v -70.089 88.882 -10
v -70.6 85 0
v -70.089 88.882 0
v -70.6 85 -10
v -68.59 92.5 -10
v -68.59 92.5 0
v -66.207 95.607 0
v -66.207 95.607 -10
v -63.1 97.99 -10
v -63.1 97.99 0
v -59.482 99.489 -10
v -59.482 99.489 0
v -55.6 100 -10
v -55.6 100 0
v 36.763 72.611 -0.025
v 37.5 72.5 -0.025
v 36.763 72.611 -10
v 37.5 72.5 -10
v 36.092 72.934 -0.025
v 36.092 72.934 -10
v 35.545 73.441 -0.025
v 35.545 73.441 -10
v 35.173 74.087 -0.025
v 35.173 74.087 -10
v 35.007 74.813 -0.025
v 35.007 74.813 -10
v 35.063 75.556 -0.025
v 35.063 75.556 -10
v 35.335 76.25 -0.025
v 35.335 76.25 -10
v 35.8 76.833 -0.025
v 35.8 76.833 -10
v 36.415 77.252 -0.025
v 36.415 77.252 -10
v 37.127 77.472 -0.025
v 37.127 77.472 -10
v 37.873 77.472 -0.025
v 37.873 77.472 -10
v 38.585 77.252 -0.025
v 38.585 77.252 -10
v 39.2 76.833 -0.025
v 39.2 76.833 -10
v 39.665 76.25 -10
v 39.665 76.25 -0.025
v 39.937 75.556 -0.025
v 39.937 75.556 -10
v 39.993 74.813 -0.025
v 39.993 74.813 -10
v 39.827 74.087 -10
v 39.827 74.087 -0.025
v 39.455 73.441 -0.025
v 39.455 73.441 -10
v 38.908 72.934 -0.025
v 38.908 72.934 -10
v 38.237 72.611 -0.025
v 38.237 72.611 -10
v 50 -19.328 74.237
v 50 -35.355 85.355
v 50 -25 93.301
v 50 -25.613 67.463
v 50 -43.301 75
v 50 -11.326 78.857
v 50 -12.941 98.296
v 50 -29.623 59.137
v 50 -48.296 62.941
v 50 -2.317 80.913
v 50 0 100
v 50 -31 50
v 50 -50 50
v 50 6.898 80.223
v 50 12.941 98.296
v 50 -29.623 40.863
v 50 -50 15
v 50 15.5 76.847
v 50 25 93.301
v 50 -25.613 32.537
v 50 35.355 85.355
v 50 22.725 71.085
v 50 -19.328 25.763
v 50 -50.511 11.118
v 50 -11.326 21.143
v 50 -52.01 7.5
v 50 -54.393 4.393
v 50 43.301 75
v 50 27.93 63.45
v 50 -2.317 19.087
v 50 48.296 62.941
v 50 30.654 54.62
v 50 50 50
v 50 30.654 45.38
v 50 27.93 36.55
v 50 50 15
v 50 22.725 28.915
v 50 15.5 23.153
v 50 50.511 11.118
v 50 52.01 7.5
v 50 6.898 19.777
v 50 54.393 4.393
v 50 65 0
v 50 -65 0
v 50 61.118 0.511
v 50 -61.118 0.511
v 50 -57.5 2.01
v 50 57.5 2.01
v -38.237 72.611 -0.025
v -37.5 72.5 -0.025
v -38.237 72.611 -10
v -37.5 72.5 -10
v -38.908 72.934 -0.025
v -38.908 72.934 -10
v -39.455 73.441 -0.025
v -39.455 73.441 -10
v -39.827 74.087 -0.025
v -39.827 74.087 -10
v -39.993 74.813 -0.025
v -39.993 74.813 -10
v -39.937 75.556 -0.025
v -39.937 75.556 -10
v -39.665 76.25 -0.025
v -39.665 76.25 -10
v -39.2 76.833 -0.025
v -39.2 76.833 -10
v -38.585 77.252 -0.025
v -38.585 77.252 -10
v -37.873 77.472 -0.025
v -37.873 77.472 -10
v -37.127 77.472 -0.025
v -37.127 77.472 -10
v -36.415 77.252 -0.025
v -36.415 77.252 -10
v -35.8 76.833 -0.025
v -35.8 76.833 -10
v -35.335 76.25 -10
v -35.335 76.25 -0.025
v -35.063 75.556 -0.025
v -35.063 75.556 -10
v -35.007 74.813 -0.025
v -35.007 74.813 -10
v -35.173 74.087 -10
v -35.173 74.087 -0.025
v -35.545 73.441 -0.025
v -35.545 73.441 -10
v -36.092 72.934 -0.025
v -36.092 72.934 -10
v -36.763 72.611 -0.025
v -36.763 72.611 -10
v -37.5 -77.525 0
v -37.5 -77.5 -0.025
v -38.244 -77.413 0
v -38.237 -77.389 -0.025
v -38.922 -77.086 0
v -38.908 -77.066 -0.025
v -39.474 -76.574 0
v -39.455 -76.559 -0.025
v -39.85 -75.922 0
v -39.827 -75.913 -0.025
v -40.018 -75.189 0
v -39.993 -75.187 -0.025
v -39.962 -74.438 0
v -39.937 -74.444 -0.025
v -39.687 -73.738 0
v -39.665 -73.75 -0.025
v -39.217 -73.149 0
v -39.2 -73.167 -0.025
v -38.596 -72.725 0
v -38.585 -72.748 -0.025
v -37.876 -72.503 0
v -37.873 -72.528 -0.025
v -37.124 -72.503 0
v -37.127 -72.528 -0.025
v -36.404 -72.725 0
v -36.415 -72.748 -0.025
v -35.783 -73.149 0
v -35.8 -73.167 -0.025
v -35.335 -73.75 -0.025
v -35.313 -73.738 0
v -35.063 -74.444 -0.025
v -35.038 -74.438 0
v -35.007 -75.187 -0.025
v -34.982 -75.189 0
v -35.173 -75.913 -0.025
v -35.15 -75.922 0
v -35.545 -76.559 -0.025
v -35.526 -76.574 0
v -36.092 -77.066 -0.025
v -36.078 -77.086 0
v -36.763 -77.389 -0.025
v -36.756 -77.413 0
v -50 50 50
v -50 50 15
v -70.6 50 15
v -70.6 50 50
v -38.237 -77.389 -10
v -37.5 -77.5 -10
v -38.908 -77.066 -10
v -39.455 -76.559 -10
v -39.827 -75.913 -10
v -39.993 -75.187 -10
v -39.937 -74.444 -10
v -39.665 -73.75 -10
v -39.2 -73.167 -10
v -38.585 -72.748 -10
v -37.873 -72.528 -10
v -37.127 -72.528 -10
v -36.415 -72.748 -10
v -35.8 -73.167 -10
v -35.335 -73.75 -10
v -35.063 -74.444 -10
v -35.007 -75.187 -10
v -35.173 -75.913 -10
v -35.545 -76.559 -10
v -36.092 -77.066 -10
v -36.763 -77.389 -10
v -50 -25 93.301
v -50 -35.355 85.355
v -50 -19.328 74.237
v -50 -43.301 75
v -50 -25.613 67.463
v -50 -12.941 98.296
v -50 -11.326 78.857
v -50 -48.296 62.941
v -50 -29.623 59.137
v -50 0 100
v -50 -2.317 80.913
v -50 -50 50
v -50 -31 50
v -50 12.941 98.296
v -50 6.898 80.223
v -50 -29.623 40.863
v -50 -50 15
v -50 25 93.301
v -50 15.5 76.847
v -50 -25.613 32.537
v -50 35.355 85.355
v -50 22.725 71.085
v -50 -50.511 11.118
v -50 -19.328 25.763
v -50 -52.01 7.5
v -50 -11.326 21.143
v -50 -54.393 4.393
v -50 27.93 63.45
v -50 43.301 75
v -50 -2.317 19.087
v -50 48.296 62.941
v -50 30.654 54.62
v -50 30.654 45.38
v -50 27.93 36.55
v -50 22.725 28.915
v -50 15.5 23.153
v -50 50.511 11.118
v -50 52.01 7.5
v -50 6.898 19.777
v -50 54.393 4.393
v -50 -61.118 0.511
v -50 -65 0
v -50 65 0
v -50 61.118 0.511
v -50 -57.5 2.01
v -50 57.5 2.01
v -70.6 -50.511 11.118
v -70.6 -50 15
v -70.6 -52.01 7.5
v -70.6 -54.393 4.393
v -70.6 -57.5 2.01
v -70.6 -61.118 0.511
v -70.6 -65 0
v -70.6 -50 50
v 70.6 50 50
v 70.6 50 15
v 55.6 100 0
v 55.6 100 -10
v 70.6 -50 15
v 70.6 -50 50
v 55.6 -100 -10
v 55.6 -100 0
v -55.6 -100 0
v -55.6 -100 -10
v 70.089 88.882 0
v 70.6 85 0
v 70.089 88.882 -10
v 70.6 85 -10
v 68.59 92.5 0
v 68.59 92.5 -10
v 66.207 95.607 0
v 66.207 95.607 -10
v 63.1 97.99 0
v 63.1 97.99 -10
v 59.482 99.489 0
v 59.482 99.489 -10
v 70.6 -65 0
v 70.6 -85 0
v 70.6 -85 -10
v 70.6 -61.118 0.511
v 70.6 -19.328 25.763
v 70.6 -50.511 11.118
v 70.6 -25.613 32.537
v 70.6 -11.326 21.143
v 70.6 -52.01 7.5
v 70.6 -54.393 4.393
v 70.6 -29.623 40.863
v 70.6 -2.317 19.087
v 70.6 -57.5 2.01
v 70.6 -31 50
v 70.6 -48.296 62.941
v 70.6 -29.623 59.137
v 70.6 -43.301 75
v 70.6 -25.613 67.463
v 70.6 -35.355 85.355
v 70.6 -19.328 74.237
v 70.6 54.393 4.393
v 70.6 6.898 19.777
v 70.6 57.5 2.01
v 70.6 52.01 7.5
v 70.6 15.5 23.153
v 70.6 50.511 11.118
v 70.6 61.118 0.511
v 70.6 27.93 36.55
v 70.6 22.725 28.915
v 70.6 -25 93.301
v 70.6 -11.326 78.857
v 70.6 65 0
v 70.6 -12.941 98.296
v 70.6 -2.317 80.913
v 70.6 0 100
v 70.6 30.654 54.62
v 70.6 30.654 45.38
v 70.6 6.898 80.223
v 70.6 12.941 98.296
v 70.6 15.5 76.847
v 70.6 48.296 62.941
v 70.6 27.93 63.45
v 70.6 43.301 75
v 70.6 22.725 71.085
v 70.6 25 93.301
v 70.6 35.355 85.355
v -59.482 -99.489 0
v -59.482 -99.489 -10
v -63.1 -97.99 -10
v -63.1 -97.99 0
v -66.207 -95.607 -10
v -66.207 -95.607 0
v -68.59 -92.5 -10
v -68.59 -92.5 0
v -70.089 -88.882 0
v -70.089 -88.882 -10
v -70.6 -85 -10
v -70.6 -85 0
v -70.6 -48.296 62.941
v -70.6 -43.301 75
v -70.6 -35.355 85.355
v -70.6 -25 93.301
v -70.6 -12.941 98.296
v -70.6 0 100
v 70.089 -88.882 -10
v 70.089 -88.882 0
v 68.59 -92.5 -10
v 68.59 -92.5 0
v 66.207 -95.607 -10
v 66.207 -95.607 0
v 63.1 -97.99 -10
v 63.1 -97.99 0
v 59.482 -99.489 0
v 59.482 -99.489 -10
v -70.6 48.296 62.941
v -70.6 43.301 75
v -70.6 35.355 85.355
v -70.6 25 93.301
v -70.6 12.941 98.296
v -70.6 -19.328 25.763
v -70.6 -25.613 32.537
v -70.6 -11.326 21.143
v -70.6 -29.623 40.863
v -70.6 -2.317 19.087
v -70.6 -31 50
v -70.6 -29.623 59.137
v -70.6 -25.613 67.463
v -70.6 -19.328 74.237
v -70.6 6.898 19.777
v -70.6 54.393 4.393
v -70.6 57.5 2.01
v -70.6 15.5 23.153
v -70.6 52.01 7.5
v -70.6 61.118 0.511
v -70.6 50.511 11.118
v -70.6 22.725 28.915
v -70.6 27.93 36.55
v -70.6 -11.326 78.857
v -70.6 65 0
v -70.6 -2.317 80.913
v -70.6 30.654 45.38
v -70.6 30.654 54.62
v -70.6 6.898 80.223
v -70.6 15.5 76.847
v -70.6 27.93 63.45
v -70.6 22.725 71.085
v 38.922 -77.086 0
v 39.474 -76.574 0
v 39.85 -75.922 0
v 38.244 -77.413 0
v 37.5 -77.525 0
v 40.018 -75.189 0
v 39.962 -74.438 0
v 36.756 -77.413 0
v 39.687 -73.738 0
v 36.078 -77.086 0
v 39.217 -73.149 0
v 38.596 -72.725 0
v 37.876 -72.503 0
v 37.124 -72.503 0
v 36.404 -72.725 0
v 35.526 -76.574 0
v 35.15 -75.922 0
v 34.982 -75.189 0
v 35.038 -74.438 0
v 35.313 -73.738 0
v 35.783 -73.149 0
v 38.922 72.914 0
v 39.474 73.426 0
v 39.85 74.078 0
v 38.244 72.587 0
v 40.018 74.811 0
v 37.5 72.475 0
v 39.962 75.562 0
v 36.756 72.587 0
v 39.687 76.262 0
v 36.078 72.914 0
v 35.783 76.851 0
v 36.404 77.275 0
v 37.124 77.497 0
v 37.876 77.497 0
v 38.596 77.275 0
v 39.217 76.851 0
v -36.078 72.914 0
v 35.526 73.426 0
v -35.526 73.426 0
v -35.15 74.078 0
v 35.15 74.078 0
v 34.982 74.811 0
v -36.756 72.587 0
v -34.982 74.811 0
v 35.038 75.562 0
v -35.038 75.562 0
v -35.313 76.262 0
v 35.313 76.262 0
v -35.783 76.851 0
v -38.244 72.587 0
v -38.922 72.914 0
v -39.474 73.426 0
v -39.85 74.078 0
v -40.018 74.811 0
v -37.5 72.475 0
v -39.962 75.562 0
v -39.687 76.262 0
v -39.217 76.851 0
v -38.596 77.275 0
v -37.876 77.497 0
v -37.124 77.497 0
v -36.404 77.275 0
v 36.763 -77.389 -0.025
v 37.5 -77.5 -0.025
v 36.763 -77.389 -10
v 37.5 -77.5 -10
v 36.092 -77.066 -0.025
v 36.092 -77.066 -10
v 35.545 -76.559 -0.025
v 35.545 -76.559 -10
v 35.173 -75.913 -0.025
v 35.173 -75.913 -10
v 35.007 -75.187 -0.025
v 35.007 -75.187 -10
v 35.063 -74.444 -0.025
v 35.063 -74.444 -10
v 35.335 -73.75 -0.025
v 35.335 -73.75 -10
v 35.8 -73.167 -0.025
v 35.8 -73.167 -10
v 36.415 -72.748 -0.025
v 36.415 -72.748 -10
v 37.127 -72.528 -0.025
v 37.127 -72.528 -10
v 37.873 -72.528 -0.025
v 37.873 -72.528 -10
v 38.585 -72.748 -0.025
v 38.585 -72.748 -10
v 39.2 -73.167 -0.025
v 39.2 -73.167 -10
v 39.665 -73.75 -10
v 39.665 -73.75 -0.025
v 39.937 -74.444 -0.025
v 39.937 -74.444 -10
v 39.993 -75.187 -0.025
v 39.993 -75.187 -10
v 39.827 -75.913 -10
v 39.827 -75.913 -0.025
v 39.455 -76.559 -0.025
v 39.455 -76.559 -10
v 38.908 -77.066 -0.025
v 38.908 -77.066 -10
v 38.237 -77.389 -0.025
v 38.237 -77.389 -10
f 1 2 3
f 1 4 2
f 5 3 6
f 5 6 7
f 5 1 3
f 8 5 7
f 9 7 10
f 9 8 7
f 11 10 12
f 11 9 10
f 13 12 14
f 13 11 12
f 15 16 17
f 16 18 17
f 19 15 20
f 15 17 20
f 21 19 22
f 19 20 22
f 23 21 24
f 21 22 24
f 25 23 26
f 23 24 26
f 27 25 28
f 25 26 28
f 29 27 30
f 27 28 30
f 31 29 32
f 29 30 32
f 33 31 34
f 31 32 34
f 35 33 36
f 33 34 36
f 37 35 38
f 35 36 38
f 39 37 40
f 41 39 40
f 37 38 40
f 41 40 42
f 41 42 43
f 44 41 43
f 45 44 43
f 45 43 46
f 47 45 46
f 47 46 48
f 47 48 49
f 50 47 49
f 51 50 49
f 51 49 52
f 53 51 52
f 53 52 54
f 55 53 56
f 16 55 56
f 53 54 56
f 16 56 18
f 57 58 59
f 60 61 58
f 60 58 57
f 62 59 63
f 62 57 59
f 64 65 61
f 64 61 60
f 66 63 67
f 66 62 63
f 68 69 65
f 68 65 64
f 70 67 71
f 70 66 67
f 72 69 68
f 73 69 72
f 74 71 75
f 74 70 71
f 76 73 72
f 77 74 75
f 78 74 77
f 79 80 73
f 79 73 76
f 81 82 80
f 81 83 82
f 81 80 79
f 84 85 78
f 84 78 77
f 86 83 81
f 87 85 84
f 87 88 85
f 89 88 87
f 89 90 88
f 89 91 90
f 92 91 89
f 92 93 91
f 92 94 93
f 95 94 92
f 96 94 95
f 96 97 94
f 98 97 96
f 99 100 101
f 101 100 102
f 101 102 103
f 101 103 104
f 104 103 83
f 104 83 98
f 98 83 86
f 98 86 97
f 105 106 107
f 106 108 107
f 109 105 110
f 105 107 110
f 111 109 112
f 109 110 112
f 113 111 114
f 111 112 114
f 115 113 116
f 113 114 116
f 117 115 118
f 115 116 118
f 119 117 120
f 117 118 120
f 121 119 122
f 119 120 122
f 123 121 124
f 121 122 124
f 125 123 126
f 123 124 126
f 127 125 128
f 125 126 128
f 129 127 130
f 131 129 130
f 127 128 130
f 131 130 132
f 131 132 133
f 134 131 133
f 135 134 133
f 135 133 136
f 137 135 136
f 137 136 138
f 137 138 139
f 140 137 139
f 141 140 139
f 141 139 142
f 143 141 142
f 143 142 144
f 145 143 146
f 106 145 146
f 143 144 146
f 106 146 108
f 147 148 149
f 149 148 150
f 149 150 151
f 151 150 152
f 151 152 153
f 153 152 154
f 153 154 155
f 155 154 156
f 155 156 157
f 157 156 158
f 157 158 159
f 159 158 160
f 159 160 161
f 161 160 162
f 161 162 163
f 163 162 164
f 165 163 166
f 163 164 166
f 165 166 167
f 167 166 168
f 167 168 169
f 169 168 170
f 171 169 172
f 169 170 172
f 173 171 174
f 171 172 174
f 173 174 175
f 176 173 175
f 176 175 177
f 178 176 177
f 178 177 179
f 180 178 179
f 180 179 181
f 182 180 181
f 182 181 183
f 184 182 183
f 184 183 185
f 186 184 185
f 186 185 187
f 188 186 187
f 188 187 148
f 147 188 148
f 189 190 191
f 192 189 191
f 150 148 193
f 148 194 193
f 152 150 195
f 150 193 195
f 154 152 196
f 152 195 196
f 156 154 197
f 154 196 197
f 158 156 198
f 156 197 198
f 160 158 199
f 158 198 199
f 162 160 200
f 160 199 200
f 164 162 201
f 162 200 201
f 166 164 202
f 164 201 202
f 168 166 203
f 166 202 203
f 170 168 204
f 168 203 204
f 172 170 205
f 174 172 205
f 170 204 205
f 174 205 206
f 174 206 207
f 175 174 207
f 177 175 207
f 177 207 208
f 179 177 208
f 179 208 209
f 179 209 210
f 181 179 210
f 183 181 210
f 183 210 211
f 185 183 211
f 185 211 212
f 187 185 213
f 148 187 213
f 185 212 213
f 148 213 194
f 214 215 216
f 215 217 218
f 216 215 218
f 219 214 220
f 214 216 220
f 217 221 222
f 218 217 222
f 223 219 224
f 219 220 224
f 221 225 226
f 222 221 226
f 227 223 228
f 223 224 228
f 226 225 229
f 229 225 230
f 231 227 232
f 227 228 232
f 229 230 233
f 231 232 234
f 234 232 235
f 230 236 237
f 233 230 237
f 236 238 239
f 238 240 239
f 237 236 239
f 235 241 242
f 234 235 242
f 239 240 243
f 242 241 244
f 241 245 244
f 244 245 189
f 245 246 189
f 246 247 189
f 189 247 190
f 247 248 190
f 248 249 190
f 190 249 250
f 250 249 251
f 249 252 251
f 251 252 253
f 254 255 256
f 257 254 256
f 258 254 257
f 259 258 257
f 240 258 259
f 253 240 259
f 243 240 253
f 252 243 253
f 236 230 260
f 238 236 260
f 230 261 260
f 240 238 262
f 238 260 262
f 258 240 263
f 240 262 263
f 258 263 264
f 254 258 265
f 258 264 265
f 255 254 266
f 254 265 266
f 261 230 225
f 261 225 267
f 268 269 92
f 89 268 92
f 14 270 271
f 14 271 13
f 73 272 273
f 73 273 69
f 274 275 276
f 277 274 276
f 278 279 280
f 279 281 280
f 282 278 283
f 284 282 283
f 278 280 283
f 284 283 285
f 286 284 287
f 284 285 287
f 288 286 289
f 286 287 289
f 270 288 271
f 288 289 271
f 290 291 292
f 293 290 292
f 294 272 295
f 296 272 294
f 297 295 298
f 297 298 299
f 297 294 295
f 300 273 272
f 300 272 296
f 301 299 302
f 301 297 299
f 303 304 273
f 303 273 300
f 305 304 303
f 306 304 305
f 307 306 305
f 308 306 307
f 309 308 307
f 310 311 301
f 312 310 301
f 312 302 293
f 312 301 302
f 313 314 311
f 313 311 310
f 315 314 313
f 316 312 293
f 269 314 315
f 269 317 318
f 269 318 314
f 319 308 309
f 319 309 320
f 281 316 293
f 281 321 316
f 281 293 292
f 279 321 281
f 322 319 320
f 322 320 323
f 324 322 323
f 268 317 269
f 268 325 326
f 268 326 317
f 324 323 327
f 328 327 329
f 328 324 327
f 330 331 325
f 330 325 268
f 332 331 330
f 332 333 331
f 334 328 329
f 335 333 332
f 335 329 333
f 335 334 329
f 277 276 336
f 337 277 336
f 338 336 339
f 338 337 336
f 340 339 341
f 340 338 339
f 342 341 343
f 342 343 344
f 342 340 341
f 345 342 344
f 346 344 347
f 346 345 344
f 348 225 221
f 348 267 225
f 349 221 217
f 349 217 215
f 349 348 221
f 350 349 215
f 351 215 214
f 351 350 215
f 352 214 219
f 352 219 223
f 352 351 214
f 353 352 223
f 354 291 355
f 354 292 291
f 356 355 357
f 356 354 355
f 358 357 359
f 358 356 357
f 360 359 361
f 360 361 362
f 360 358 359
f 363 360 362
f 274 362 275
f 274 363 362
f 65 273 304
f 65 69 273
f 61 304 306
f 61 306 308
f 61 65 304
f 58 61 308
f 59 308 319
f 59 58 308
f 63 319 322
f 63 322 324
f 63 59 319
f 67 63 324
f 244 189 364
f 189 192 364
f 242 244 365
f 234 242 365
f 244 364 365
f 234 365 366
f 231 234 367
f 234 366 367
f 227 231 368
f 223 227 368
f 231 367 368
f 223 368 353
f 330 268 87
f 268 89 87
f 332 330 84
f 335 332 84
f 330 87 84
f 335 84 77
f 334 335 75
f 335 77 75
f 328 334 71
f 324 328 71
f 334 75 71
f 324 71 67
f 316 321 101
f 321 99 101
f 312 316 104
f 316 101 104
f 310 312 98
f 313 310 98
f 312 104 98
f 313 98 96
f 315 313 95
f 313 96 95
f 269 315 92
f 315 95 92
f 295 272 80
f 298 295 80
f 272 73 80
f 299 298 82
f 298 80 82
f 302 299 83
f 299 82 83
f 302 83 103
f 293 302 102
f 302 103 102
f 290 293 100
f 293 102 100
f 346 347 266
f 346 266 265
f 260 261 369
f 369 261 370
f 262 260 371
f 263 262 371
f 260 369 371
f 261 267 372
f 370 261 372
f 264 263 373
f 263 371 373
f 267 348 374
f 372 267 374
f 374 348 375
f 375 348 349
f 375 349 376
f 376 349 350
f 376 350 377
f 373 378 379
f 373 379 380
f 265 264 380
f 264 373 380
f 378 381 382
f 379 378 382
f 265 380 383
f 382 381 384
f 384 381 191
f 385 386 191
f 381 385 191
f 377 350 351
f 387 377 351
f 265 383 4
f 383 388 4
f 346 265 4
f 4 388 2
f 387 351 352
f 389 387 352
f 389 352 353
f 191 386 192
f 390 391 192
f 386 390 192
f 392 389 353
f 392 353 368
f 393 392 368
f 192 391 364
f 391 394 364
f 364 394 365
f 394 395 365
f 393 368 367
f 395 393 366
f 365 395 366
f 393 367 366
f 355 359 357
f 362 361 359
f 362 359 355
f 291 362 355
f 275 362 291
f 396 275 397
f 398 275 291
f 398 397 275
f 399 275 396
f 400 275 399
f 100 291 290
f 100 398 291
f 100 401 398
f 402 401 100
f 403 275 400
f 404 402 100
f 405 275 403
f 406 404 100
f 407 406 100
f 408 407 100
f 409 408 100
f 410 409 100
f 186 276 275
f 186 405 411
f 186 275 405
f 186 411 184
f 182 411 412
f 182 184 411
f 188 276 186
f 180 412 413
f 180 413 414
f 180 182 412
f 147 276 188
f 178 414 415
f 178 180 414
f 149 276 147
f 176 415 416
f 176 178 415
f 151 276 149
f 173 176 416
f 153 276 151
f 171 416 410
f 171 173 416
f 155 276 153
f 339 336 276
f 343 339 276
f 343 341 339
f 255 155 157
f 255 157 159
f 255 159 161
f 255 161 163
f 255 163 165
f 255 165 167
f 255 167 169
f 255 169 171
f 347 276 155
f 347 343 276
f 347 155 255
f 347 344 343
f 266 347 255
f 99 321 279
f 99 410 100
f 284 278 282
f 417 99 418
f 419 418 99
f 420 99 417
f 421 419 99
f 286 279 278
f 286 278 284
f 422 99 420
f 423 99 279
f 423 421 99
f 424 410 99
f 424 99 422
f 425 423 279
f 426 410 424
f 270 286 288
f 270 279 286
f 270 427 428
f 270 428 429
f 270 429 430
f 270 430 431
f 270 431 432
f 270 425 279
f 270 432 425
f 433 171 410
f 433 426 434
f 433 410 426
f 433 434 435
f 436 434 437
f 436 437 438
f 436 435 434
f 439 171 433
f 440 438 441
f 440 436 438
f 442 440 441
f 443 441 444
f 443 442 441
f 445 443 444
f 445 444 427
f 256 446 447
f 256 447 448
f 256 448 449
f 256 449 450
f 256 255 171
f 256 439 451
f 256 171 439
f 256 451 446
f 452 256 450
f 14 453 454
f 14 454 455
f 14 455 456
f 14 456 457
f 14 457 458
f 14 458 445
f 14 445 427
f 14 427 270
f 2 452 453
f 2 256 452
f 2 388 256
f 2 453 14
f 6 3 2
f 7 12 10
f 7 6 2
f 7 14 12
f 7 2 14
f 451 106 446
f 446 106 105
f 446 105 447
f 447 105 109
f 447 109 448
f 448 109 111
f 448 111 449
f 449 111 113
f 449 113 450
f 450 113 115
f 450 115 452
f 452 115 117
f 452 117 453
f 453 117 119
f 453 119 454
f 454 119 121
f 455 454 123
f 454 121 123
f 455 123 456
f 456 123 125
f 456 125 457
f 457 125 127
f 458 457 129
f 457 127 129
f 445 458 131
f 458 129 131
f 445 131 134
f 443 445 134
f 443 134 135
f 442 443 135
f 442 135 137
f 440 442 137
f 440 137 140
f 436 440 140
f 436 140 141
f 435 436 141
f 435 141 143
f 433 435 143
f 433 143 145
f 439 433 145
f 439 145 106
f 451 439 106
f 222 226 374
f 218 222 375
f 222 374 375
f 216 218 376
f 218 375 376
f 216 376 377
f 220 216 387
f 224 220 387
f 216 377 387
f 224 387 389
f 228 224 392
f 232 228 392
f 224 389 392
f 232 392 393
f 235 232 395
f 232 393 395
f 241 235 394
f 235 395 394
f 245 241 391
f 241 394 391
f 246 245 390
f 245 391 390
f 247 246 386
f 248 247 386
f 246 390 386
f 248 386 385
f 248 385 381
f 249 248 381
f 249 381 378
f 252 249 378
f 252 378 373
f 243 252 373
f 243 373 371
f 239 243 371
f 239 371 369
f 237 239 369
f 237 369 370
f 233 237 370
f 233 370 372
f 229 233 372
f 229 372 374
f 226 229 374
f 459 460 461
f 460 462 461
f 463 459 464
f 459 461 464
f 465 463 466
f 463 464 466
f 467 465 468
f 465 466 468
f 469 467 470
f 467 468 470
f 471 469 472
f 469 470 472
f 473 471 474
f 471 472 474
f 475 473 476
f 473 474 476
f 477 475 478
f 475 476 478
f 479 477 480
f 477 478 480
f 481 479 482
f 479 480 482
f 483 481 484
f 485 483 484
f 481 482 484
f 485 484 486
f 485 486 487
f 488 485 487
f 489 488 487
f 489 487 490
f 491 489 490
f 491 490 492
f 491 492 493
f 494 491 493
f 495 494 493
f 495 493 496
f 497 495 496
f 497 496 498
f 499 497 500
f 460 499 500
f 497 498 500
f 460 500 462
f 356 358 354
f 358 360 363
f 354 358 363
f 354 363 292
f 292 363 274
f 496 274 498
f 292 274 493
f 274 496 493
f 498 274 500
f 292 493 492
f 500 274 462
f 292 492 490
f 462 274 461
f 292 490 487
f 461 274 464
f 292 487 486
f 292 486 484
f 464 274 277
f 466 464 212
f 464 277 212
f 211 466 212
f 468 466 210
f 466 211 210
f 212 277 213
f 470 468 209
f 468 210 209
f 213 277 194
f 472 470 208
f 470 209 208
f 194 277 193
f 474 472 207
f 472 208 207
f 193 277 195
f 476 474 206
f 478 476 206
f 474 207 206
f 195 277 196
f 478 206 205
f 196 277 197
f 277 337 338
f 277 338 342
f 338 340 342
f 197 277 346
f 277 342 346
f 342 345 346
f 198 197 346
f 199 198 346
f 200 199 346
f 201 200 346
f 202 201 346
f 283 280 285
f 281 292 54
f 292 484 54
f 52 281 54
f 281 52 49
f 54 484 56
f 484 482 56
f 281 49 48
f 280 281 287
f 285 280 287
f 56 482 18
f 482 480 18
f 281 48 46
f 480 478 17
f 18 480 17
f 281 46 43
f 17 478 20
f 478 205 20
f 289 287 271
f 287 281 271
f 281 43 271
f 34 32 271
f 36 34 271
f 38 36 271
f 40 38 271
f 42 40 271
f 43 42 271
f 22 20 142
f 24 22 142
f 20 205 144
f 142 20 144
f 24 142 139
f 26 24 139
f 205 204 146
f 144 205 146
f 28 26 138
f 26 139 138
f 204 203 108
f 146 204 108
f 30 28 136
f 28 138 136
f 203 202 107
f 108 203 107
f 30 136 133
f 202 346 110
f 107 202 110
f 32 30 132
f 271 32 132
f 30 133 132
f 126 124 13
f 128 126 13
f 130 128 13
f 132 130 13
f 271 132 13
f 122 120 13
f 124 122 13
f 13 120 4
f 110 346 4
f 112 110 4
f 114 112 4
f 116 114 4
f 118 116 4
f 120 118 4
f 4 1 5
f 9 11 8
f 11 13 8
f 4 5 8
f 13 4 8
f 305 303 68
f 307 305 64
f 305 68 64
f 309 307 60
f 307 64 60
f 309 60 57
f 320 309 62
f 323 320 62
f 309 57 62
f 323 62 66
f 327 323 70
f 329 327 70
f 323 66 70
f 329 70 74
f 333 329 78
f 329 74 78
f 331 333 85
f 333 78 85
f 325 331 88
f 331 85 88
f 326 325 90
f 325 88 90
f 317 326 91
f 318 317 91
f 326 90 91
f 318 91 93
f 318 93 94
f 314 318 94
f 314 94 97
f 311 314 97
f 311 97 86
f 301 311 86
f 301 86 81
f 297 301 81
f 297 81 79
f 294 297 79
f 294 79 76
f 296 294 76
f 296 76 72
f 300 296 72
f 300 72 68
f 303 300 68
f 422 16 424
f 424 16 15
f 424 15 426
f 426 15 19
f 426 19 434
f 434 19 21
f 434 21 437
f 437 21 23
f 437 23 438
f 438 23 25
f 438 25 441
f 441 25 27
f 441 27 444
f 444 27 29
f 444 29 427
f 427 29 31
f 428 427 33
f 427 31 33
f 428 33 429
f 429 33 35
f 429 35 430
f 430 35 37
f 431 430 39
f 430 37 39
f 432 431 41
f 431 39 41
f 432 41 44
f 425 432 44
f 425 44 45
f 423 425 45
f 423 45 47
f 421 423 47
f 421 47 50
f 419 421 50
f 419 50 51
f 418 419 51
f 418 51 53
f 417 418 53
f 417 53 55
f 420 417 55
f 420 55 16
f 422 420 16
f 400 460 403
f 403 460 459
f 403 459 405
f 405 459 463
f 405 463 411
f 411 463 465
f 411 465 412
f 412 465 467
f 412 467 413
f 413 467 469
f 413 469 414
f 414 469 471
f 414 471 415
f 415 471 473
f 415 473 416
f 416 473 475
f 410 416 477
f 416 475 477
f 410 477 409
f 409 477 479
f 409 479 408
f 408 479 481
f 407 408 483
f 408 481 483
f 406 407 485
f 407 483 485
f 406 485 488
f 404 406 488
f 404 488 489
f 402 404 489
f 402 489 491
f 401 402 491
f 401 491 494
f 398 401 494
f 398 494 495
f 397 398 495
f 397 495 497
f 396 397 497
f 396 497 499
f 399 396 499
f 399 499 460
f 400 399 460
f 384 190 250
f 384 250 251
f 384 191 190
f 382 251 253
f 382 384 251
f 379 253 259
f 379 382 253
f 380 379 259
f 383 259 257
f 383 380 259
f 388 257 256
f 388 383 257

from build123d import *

# Parameters (mm, degrees)
SKETCH1_W                       = 200
SKETCH1_H                       = 141.2
BOSS_EXTRUDE1_DEPTH             = 10
SKETCH2_W                       = 100
SKETCH2_H                       = 20.6
BOSS_EXTRUDE2_DEPTH             = 100
FILLET1_R                       = 50
F_10_0MM_DOWEL_HOLE1_D          = 62
F_5_0MM_DOWEL_HOLE1_D           = 5
F_5_0MM_DOWEL_HOLE1_CSINK_D     = 5.05
F_5_0MM_DOWEL_HOLE1_CSINK_ANGLE = 90
FILLET2_R                       = 15


with BuildPart() as part:
    # Sketch1 → Boss-Extrude1 (new body)
    with BuildSketch(Plane(origin=(0, 0, 0), x_dir=(0, 1, 0), z_dir=(0, 0, 1))):
        Rectangle(SKETCH1_W, SKETCH1_H)
    extrude(amount=-BOSS_EXTRUDE1_DEPTH)

    # Sketch2 → Boss-Extrude2 (add)
    with BuildSketch(Plane(origin=(0, 0, 0), x_dir=(0, 1, 0), z_dir=(0, 0, 1))):
        with Locations((0, 60.3)):
            Rectangle(SKETCH2_W, SKETCH2_H)
        with Locations((0, -60.3)):
            Rectangle(SKETCH2_W, SKETCH2_H)
    extrude(amount=BOSS_EXTRUDE2_DEPTH)

    # Fillet1
    fillet1_edges = [part.edges().sort_by_distance(p)[0] for p in [
        (60.3, 50, 100),
        (60.3, -50, 100),
        (-60.3, 50, 100),
        (-60.3, -50, 100),
    ]]
    fillet(fillet1_edges, radius=FILLET1_R - 0.0001)  # a hair under: the kernel refuses the full size

    # Ø10.0mm Dowel Hole1 (through all)
    with Locations(Plane.YZ.offset(70.6)):
        with Locations((0, 50)):
            Hole(F_10_0MM_DOWEL_HOLE1_D / 2)

    # Ø5.0mm Dowel Hole1 (through all)
    with Locations(Plane(origin=(0, 0, 0), x_dir=(0, 1, 0), z_dir=(0, 0, 1))):
        with Locations((75, -37.5), (-75, 37.5), (-75, -37.5), (75, 37.5)):
            CounterSinkHole(F_5_0MM_DOWEL_HOLE1_D / 2, F_5_0MM_DOWEL_HOLE1_CSINK_D / 2, counter_sink_angle=F_5_0MM_DOWEL_HOLE1_CSINK_ANGLE)

    # Fillet2
    fillet2_edges = [part.edges().sort_by_distance(p)[0] for p in [
        (-60.3, -50, 0),
        (-60.3, 50, 0),
        (60.3, -50, 0),
        (60.3, 50, 0),
        (-70.6, -100, -5),
        (-70.6, 100, -5),
        (70.6, 100, -5),
        (70.6, -100, -5),
    ]]
    fillet(fillet2_edges, radius=FILLET2_R)


solid = part.part
